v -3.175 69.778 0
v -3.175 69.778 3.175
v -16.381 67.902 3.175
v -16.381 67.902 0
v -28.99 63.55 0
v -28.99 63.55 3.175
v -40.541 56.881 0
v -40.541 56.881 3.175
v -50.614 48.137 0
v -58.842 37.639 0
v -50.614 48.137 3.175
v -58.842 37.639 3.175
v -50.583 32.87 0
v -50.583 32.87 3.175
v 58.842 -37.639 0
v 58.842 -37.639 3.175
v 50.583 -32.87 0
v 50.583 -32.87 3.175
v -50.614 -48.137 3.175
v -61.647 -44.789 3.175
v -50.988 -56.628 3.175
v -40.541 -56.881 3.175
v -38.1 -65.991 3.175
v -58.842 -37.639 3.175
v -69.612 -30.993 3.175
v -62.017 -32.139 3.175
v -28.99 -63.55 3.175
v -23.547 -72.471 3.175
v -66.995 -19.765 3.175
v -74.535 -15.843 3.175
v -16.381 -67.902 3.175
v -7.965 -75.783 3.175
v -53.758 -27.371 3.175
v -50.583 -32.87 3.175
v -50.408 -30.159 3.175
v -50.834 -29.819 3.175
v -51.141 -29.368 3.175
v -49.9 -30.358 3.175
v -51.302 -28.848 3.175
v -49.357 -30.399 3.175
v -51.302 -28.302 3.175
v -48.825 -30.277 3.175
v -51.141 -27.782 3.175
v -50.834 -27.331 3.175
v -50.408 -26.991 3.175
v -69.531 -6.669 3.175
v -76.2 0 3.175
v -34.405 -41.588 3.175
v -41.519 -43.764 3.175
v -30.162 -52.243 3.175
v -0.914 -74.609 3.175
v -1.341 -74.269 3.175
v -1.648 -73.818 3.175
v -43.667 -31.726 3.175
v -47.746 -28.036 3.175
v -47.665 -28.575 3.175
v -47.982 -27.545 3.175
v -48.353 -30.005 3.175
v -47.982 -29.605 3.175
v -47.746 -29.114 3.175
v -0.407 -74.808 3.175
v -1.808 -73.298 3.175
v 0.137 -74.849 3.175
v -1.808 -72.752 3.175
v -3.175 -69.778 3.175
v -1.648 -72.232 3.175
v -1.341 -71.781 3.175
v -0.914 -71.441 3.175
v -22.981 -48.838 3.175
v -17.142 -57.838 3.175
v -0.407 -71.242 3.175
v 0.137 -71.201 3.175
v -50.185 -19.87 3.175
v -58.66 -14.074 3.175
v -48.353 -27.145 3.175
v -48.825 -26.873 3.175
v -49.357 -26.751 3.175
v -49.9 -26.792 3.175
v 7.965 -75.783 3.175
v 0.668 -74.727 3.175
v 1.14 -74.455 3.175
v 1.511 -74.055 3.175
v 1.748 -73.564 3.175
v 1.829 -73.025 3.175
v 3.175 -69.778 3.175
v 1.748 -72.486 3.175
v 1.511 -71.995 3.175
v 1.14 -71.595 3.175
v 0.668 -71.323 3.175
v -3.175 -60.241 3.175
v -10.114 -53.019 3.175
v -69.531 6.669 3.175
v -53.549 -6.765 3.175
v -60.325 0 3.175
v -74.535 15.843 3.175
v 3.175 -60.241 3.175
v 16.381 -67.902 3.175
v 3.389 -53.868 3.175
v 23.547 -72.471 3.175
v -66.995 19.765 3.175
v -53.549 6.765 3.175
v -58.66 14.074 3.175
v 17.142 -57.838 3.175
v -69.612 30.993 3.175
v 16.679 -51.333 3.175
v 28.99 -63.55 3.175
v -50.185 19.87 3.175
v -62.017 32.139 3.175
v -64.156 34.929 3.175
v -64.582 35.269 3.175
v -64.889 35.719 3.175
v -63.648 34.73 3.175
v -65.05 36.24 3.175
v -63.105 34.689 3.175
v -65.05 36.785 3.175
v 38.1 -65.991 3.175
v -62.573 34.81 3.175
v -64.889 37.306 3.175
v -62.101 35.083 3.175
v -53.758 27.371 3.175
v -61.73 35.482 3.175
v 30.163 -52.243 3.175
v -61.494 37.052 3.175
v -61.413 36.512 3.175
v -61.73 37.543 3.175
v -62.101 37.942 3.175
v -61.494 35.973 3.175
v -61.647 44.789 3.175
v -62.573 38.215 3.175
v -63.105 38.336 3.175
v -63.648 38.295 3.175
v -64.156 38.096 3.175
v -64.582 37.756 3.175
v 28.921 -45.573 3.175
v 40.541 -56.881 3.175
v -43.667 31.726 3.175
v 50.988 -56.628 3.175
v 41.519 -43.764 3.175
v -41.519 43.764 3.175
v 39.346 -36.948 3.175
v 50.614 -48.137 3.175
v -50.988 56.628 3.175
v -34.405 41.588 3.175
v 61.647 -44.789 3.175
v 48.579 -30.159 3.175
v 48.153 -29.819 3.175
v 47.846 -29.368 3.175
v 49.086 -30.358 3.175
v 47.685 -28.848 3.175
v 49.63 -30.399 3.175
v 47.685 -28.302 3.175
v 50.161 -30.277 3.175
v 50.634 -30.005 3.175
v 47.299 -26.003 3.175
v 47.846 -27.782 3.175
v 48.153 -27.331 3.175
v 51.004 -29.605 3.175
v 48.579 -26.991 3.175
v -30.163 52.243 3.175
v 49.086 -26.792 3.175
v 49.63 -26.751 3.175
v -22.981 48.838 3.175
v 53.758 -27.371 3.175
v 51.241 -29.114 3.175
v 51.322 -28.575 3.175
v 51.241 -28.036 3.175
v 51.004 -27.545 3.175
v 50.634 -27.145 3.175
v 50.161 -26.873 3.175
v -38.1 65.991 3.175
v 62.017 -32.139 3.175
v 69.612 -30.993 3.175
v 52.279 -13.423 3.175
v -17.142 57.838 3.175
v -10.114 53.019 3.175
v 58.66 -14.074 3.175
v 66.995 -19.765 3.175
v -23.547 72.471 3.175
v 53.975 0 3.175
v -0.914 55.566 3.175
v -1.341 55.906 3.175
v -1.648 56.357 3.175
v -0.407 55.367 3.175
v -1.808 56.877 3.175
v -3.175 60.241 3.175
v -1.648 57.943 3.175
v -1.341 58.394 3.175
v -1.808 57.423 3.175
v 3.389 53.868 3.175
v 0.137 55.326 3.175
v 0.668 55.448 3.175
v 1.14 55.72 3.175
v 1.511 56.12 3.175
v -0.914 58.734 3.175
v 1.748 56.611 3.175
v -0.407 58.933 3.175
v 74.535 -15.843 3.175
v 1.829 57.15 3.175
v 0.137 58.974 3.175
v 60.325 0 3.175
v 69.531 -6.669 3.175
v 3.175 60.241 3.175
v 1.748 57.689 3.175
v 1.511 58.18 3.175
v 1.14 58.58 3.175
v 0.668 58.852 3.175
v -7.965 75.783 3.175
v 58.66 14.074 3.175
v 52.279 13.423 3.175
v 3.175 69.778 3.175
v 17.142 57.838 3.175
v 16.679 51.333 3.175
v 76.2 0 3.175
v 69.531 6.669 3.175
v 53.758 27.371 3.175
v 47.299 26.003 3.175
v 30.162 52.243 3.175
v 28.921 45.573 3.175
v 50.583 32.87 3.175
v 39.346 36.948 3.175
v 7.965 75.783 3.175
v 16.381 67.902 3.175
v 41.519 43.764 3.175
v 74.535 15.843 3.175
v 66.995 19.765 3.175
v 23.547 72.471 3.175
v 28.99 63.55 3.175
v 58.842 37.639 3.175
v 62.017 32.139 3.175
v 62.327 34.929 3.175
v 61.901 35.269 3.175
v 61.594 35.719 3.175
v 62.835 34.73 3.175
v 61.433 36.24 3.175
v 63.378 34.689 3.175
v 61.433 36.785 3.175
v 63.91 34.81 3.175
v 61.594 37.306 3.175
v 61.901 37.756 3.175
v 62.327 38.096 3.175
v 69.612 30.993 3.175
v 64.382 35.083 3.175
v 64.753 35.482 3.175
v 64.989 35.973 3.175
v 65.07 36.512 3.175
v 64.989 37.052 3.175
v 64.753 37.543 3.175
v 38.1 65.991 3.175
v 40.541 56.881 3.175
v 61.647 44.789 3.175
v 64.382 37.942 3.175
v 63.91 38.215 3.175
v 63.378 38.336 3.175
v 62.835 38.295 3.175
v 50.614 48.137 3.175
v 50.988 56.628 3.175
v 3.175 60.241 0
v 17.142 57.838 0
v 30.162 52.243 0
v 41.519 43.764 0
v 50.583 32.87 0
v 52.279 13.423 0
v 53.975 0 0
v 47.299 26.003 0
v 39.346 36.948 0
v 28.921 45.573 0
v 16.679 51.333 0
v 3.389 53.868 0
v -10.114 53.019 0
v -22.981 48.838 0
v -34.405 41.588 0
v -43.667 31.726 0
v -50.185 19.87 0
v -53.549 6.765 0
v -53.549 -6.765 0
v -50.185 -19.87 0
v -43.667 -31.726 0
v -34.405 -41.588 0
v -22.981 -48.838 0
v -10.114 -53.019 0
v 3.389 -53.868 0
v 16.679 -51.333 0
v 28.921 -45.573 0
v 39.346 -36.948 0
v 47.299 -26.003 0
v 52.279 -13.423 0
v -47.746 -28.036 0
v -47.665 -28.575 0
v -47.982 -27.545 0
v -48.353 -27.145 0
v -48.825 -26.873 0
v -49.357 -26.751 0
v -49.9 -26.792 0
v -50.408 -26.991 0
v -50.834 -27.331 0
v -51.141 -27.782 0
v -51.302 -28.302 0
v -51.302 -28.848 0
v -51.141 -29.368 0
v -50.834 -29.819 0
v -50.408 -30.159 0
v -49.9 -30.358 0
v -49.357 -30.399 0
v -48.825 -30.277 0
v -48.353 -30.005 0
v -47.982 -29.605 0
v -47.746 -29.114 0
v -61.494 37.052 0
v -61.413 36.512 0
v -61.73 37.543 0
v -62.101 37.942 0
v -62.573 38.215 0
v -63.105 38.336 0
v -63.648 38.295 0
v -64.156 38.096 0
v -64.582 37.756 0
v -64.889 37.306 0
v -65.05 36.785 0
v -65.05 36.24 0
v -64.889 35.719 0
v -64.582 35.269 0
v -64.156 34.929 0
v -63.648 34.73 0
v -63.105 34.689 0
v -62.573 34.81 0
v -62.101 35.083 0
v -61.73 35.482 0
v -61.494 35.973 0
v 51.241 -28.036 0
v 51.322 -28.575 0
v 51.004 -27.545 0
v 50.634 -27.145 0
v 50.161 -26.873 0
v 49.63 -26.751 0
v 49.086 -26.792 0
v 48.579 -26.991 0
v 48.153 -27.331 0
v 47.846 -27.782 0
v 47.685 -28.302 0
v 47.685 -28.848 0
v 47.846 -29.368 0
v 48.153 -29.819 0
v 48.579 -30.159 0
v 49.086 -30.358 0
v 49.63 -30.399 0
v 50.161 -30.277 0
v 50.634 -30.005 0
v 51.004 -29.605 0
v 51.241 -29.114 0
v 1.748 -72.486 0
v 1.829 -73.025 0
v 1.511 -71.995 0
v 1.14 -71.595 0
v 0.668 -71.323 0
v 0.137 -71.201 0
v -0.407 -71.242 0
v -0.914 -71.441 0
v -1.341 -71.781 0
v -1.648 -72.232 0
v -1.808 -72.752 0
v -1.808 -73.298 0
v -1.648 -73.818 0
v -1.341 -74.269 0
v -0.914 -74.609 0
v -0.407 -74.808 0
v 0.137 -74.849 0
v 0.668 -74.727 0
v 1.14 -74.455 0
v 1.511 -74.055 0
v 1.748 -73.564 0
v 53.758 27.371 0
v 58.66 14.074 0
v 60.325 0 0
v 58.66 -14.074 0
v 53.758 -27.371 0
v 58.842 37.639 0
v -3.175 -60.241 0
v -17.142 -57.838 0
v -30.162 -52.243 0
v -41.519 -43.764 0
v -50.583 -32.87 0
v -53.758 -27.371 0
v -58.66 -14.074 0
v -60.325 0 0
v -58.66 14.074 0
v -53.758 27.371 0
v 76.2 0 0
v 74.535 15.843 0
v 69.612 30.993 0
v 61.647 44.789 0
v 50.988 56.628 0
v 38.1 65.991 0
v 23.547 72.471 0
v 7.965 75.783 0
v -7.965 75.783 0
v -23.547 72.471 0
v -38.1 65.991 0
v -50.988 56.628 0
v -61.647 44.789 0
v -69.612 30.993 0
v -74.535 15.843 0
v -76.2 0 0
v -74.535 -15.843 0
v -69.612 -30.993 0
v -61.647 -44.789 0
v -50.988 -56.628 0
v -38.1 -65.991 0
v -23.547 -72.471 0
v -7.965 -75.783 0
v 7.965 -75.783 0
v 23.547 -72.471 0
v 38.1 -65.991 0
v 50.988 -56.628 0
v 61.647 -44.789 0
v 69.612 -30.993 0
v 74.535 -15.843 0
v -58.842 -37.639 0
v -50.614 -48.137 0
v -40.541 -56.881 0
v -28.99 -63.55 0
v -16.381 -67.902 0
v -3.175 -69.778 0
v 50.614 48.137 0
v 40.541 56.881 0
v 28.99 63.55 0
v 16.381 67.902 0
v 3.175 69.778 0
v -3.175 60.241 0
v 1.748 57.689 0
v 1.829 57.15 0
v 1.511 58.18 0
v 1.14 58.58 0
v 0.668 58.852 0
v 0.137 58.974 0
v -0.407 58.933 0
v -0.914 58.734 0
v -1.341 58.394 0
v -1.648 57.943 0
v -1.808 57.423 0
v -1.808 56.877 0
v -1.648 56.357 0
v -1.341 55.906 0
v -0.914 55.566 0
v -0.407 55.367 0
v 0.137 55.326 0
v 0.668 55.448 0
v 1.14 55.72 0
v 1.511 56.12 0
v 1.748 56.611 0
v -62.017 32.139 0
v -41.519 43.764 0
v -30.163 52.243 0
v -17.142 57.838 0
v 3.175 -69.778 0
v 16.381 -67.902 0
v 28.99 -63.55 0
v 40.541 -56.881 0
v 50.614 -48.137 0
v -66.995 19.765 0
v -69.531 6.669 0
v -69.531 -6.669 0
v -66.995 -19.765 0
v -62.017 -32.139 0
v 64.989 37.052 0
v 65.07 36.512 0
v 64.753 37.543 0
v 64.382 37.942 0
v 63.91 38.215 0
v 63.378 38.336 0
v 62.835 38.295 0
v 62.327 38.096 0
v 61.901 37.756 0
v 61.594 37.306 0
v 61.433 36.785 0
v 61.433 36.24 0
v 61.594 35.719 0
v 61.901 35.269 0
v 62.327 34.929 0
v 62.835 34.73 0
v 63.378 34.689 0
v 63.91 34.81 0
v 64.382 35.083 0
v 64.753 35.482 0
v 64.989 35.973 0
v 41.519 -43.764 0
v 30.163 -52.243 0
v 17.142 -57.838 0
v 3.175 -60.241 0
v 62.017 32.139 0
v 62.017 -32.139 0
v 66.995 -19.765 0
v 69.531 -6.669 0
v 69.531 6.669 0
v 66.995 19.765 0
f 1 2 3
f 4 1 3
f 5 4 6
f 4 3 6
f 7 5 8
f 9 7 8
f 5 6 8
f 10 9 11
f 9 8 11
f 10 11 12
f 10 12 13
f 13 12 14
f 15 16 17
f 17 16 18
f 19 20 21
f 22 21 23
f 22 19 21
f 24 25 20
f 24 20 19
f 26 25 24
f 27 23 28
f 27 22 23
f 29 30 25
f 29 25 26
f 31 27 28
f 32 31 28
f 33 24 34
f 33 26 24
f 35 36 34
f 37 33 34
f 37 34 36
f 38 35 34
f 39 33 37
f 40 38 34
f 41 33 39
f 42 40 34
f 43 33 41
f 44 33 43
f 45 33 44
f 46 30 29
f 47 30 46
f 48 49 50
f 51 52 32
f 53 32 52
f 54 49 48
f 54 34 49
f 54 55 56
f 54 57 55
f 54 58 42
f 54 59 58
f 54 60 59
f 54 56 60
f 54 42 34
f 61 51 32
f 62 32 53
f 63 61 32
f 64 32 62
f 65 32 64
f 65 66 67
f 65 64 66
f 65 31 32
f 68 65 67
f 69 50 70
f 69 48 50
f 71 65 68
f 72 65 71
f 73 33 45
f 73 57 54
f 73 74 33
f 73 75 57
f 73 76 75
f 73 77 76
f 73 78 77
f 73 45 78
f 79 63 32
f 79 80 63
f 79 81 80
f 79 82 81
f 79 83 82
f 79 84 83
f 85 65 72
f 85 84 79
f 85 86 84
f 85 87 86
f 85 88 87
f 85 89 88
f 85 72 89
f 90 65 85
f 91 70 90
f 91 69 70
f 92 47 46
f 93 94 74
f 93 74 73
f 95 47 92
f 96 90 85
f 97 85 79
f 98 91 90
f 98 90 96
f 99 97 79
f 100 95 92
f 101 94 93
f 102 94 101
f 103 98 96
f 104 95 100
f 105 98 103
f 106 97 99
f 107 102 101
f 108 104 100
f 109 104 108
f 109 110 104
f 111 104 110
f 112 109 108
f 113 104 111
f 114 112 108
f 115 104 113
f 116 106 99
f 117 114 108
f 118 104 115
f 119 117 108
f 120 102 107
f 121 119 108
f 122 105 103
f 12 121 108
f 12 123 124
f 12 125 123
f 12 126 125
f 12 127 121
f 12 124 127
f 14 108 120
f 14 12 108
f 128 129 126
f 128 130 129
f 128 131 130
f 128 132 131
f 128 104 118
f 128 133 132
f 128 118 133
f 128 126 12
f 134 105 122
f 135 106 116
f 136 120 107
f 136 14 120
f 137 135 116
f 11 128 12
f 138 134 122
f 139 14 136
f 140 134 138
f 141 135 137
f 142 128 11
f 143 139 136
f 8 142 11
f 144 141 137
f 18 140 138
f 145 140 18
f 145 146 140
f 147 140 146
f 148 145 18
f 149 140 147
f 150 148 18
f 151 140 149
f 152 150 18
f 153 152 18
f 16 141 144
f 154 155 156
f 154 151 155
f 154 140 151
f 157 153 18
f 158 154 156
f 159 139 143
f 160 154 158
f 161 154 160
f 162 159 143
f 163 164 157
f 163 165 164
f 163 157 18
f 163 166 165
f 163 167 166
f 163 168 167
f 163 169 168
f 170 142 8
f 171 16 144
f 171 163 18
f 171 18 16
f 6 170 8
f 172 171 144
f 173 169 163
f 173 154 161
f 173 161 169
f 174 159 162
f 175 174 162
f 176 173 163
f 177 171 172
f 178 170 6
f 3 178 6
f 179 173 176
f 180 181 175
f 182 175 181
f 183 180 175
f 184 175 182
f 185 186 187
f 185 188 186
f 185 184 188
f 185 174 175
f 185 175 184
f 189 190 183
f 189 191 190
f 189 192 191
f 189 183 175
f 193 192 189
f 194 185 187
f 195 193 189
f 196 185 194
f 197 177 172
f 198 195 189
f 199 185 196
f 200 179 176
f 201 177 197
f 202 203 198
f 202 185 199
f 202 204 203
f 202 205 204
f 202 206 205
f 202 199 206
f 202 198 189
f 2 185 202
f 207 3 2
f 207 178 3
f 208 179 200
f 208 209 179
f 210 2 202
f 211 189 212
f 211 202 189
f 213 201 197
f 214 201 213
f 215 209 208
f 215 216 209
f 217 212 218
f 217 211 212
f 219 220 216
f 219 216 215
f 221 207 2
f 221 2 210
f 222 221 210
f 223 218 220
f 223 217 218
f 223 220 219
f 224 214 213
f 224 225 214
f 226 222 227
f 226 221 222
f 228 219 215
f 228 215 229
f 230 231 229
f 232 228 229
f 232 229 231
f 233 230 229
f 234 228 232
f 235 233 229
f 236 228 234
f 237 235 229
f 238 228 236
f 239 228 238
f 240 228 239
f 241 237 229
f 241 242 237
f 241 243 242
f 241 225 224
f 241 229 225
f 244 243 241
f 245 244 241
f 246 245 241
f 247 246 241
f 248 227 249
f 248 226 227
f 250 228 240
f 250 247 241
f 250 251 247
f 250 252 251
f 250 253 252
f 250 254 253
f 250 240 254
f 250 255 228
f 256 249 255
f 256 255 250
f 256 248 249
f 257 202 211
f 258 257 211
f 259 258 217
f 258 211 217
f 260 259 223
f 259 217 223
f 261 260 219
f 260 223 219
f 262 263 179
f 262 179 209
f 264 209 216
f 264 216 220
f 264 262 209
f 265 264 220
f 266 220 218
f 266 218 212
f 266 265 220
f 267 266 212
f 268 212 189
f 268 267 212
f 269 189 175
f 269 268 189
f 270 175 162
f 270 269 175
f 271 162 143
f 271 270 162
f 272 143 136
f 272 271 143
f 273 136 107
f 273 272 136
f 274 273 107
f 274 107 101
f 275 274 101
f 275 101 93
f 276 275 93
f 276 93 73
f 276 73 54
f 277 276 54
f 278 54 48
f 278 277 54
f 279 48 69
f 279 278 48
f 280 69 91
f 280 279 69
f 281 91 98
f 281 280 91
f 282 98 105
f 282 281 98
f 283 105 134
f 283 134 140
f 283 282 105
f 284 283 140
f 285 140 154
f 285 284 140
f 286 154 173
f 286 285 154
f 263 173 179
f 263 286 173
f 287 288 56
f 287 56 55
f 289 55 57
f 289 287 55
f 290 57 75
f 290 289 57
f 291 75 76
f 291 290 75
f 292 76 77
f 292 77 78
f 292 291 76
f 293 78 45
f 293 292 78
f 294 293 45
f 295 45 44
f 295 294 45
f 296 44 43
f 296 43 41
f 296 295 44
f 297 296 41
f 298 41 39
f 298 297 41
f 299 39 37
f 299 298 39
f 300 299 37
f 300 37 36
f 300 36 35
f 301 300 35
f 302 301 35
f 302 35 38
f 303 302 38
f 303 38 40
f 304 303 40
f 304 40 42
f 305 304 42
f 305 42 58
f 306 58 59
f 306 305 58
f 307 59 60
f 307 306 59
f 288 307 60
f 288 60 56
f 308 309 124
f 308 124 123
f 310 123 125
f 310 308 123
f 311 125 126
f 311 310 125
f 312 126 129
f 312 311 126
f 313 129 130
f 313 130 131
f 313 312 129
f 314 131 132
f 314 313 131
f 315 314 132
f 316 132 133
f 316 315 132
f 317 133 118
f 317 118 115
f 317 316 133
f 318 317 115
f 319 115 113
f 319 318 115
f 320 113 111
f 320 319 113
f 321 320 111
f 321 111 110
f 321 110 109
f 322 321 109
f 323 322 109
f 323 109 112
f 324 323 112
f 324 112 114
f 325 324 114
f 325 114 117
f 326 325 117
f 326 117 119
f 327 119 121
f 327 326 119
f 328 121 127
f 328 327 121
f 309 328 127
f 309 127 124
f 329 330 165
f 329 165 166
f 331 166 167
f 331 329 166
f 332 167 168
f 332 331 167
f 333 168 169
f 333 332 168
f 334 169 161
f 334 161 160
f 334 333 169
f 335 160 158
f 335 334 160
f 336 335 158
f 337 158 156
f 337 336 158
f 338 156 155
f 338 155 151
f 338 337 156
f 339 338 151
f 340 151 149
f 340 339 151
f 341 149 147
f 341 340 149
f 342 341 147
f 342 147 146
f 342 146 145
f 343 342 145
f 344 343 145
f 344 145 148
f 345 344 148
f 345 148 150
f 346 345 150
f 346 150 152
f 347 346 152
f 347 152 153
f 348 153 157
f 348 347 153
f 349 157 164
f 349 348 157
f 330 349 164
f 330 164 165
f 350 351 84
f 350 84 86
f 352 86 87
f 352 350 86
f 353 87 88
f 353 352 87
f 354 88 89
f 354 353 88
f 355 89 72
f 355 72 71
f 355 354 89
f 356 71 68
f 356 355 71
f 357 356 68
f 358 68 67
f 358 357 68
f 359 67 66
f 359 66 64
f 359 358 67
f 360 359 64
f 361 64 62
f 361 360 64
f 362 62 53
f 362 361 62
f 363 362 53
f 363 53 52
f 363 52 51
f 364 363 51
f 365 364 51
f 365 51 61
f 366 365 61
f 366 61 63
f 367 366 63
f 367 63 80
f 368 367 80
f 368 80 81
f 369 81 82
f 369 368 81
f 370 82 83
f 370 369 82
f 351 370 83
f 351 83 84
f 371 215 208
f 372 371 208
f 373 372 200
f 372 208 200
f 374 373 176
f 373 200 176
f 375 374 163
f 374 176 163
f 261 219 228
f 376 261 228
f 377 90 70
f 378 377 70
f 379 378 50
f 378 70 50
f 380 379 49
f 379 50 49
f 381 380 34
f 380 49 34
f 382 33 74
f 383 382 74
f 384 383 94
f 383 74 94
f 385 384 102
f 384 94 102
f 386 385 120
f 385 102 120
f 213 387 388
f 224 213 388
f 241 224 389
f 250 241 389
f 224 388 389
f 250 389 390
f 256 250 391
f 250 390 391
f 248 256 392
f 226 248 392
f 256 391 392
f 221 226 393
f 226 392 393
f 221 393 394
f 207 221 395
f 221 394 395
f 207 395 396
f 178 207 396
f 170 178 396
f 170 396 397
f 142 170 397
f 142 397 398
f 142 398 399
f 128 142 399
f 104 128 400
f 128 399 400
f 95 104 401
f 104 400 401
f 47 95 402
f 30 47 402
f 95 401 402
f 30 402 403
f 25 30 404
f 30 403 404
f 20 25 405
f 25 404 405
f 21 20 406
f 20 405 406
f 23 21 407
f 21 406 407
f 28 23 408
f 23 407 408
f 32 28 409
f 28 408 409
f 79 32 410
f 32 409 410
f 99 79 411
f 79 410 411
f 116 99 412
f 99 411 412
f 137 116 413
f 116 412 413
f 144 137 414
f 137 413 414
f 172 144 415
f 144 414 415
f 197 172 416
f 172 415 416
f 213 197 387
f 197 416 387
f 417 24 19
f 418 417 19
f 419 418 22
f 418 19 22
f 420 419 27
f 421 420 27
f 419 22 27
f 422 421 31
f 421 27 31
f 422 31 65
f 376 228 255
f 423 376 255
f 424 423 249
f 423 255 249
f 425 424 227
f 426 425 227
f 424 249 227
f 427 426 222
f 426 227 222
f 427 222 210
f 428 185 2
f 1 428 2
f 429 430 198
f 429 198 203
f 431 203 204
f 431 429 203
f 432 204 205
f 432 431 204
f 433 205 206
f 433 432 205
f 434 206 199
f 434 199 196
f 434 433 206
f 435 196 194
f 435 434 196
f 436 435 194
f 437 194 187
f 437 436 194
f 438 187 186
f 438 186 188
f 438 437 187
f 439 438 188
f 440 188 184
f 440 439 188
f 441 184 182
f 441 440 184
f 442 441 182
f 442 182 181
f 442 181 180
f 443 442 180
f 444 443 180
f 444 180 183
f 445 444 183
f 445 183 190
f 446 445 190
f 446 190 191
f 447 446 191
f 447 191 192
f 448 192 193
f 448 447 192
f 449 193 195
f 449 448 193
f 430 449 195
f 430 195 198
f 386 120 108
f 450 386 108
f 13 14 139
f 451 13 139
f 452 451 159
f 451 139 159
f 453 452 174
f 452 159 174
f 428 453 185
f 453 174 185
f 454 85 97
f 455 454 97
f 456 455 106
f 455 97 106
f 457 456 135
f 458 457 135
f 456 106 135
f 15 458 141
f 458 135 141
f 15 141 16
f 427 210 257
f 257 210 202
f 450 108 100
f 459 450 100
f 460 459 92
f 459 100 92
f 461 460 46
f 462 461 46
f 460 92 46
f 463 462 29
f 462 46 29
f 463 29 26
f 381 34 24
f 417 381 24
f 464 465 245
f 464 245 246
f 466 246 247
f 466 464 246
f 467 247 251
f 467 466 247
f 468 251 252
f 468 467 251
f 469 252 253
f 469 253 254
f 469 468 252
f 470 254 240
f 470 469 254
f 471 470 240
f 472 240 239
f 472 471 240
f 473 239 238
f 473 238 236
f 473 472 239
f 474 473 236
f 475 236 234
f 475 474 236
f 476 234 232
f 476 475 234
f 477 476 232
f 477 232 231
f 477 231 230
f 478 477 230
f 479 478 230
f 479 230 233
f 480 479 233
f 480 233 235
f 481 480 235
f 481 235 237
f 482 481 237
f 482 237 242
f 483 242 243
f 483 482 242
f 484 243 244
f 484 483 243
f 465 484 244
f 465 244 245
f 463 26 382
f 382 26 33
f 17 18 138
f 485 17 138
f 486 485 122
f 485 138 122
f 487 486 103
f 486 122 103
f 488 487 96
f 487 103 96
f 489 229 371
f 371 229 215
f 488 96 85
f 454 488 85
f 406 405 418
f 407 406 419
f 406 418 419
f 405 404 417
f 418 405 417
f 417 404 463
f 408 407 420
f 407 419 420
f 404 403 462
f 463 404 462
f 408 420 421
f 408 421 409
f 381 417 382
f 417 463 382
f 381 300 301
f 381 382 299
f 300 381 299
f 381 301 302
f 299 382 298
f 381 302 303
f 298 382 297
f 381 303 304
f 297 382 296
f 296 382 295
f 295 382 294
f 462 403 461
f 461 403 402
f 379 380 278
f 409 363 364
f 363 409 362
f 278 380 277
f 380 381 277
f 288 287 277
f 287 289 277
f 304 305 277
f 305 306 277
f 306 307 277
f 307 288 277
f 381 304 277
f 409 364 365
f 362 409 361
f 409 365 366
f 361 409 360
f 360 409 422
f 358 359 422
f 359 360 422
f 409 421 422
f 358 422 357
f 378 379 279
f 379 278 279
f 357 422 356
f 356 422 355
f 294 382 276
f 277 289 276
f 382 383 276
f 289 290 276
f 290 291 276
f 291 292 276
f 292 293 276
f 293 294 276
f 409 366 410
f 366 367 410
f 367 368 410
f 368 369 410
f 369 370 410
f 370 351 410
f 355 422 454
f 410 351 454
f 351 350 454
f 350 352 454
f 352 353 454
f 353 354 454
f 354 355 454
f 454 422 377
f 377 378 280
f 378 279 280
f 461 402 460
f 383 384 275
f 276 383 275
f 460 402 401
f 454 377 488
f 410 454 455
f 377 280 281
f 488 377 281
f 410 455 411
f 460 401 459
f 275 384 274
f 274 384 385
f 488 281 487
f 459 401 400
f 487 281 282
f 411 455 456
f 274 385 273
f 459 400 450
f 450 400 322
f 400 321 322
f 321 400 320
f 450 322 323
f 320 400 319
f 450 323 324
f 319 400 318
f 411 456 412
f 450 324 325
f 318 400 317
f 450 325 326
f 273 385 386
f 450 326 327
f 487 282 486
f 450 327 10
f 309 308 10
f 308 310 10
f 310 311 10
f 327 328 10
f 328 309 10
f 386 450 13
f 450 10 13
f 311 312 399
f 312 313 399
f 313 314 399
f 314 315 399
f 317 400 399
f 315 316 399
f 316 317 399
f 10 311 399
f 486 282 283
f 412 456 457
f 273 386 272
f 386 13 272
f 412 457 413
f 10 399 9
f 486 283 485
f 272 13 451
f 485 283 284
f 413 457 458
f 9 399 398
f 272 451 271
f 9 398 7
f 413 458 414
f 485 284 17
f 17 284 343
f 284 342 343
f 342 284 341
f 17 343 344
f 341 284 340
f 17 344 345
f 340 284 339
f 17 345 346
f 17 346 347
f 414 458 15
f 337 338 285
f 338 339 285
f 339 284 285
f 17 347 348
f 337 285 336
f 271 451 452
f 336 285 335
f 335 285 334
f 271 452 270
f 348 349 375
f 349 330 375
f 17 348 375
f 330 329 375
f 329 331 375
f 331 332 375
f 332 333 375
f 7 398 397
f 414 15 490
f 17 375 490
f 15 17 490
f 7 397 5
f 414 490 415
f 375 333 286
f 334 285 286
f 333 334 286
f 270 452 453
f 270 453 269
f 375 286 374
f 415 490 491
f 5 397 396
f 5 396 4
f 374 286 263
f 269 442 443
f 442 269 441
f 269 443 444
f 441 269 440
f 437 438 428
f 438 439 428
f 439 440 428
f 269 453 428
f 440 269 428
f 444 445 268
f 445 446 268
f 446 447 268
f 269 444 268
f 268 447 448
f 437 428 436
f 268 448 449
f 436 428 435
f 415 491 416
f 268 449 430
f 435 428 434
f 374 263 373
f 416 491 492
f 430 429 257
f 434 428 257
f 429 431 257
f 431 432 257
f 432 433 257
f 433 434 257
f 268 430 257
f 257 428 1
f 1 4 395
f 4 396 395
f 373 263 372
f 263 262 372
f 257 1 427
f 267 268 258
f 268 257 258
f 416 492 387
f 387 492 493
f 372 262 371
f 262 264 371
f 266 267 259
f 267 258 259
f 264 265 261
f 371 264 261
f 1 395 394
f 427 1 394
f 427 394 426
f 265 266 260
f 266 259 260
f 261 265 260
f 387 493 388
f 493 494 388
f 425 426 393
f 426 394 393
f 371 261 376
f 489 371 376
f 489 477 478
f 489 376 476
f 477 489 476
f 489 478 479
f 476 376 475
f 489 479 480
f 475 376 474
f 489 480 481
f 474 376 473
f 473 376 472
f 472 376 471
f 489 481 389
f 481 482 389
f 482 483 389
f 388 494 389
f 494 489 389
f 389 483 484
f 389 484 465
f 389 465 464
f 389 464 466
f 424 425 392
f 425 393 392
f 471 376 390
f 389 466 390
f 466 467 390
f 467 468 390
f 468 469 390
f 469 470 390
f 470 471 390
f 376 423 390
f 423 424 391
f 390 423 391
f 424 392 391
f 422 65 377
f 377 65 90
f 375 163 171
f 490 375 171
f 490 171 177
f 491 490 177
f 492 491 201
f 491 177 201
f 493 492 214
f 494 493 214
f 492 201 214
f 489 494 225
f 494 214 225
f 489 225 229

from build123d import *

# Parameters (mm, degrees)
F0_R            = 76.2
F0_R_2          = 1.8288
F0_R_3          = 53.975
F1_DEPTH        = 3.175
F3_DEPTH        = 3.175
F3_COPIES_COUNT = 6


# Not quite as in the source:
# - a pattern or mirror of a feature is missing from the dataset's text; its kind, count and spacing are read off the source's solid


with BuildPart() as f1:
    # F0 (on Top) → F1 (new body)
    with BuildSketch(Plane.XY):
        Circle(F0_R)
        with Locations((-49.4933518263, -28.575)):
            Circle(F0_R_2, mode=Mode.SUBTRACT)
        with Locations((0, -73.025)):
            Circle(F0_R_2, mode=Mode.SUBTRACT)
        with Locations((49.4933518263, -28.575)):
            Circle(F0_R_2, mode=Mode.SUBTRACT)
        with Locations((-63.2415051114, 36.5125)):
            Circle(F0_R_2, mode=Mode.SUBTRACT)
        Circle(F0_R_3, mode=Mode.SUBTRACT)
        with Locations((63.2415051114, 36.5125)):
            Circle(F0_R_2, mode=Mode.SUBTRACT)
        with Locations((0, 57.15)):
            Circle(F0_R_2, mode=Mode.SUBTRACT)
    extrude(amount=F1_DEPTH)

    # F2 (on face) → F3 (cut, through all)
    with BuildSketch(Plane.XY.offset(3.175)):
        with BuildLine():
            Line((-3.175, 60.2413894262), (-3.175, 69.7778035983))
            ThreePointArc((-3.175, 69.7778035983), (-34.925, 60.4918744543), (-58.8418505364, 37.6385324562))
            Line((-58.8418505364, 37.6385324562), (-50.5830736024, 32.8703253701))
            ThreePointArc((-50.5830736024, 32.8703253701), (-30.1625, 52.2429824833), (-3.175, 60.2413894262))
        make_face()
    f3 = extrude(amount=-F3_DEPTH, mode=Mode.SUBTRACT)

    # F3_copies: F3 ×6 about axis
    f3_copies_axis = Axis((0, 0, 0), (0, 0, 1))
    for i in range(1, F3_COPIES_COUNT):
        add(f3.rotate(f3_copies_axis, i * 360 / F3_COPIES_COUNT), mode=Mode.SUBTRACT)


solid = f1.part
